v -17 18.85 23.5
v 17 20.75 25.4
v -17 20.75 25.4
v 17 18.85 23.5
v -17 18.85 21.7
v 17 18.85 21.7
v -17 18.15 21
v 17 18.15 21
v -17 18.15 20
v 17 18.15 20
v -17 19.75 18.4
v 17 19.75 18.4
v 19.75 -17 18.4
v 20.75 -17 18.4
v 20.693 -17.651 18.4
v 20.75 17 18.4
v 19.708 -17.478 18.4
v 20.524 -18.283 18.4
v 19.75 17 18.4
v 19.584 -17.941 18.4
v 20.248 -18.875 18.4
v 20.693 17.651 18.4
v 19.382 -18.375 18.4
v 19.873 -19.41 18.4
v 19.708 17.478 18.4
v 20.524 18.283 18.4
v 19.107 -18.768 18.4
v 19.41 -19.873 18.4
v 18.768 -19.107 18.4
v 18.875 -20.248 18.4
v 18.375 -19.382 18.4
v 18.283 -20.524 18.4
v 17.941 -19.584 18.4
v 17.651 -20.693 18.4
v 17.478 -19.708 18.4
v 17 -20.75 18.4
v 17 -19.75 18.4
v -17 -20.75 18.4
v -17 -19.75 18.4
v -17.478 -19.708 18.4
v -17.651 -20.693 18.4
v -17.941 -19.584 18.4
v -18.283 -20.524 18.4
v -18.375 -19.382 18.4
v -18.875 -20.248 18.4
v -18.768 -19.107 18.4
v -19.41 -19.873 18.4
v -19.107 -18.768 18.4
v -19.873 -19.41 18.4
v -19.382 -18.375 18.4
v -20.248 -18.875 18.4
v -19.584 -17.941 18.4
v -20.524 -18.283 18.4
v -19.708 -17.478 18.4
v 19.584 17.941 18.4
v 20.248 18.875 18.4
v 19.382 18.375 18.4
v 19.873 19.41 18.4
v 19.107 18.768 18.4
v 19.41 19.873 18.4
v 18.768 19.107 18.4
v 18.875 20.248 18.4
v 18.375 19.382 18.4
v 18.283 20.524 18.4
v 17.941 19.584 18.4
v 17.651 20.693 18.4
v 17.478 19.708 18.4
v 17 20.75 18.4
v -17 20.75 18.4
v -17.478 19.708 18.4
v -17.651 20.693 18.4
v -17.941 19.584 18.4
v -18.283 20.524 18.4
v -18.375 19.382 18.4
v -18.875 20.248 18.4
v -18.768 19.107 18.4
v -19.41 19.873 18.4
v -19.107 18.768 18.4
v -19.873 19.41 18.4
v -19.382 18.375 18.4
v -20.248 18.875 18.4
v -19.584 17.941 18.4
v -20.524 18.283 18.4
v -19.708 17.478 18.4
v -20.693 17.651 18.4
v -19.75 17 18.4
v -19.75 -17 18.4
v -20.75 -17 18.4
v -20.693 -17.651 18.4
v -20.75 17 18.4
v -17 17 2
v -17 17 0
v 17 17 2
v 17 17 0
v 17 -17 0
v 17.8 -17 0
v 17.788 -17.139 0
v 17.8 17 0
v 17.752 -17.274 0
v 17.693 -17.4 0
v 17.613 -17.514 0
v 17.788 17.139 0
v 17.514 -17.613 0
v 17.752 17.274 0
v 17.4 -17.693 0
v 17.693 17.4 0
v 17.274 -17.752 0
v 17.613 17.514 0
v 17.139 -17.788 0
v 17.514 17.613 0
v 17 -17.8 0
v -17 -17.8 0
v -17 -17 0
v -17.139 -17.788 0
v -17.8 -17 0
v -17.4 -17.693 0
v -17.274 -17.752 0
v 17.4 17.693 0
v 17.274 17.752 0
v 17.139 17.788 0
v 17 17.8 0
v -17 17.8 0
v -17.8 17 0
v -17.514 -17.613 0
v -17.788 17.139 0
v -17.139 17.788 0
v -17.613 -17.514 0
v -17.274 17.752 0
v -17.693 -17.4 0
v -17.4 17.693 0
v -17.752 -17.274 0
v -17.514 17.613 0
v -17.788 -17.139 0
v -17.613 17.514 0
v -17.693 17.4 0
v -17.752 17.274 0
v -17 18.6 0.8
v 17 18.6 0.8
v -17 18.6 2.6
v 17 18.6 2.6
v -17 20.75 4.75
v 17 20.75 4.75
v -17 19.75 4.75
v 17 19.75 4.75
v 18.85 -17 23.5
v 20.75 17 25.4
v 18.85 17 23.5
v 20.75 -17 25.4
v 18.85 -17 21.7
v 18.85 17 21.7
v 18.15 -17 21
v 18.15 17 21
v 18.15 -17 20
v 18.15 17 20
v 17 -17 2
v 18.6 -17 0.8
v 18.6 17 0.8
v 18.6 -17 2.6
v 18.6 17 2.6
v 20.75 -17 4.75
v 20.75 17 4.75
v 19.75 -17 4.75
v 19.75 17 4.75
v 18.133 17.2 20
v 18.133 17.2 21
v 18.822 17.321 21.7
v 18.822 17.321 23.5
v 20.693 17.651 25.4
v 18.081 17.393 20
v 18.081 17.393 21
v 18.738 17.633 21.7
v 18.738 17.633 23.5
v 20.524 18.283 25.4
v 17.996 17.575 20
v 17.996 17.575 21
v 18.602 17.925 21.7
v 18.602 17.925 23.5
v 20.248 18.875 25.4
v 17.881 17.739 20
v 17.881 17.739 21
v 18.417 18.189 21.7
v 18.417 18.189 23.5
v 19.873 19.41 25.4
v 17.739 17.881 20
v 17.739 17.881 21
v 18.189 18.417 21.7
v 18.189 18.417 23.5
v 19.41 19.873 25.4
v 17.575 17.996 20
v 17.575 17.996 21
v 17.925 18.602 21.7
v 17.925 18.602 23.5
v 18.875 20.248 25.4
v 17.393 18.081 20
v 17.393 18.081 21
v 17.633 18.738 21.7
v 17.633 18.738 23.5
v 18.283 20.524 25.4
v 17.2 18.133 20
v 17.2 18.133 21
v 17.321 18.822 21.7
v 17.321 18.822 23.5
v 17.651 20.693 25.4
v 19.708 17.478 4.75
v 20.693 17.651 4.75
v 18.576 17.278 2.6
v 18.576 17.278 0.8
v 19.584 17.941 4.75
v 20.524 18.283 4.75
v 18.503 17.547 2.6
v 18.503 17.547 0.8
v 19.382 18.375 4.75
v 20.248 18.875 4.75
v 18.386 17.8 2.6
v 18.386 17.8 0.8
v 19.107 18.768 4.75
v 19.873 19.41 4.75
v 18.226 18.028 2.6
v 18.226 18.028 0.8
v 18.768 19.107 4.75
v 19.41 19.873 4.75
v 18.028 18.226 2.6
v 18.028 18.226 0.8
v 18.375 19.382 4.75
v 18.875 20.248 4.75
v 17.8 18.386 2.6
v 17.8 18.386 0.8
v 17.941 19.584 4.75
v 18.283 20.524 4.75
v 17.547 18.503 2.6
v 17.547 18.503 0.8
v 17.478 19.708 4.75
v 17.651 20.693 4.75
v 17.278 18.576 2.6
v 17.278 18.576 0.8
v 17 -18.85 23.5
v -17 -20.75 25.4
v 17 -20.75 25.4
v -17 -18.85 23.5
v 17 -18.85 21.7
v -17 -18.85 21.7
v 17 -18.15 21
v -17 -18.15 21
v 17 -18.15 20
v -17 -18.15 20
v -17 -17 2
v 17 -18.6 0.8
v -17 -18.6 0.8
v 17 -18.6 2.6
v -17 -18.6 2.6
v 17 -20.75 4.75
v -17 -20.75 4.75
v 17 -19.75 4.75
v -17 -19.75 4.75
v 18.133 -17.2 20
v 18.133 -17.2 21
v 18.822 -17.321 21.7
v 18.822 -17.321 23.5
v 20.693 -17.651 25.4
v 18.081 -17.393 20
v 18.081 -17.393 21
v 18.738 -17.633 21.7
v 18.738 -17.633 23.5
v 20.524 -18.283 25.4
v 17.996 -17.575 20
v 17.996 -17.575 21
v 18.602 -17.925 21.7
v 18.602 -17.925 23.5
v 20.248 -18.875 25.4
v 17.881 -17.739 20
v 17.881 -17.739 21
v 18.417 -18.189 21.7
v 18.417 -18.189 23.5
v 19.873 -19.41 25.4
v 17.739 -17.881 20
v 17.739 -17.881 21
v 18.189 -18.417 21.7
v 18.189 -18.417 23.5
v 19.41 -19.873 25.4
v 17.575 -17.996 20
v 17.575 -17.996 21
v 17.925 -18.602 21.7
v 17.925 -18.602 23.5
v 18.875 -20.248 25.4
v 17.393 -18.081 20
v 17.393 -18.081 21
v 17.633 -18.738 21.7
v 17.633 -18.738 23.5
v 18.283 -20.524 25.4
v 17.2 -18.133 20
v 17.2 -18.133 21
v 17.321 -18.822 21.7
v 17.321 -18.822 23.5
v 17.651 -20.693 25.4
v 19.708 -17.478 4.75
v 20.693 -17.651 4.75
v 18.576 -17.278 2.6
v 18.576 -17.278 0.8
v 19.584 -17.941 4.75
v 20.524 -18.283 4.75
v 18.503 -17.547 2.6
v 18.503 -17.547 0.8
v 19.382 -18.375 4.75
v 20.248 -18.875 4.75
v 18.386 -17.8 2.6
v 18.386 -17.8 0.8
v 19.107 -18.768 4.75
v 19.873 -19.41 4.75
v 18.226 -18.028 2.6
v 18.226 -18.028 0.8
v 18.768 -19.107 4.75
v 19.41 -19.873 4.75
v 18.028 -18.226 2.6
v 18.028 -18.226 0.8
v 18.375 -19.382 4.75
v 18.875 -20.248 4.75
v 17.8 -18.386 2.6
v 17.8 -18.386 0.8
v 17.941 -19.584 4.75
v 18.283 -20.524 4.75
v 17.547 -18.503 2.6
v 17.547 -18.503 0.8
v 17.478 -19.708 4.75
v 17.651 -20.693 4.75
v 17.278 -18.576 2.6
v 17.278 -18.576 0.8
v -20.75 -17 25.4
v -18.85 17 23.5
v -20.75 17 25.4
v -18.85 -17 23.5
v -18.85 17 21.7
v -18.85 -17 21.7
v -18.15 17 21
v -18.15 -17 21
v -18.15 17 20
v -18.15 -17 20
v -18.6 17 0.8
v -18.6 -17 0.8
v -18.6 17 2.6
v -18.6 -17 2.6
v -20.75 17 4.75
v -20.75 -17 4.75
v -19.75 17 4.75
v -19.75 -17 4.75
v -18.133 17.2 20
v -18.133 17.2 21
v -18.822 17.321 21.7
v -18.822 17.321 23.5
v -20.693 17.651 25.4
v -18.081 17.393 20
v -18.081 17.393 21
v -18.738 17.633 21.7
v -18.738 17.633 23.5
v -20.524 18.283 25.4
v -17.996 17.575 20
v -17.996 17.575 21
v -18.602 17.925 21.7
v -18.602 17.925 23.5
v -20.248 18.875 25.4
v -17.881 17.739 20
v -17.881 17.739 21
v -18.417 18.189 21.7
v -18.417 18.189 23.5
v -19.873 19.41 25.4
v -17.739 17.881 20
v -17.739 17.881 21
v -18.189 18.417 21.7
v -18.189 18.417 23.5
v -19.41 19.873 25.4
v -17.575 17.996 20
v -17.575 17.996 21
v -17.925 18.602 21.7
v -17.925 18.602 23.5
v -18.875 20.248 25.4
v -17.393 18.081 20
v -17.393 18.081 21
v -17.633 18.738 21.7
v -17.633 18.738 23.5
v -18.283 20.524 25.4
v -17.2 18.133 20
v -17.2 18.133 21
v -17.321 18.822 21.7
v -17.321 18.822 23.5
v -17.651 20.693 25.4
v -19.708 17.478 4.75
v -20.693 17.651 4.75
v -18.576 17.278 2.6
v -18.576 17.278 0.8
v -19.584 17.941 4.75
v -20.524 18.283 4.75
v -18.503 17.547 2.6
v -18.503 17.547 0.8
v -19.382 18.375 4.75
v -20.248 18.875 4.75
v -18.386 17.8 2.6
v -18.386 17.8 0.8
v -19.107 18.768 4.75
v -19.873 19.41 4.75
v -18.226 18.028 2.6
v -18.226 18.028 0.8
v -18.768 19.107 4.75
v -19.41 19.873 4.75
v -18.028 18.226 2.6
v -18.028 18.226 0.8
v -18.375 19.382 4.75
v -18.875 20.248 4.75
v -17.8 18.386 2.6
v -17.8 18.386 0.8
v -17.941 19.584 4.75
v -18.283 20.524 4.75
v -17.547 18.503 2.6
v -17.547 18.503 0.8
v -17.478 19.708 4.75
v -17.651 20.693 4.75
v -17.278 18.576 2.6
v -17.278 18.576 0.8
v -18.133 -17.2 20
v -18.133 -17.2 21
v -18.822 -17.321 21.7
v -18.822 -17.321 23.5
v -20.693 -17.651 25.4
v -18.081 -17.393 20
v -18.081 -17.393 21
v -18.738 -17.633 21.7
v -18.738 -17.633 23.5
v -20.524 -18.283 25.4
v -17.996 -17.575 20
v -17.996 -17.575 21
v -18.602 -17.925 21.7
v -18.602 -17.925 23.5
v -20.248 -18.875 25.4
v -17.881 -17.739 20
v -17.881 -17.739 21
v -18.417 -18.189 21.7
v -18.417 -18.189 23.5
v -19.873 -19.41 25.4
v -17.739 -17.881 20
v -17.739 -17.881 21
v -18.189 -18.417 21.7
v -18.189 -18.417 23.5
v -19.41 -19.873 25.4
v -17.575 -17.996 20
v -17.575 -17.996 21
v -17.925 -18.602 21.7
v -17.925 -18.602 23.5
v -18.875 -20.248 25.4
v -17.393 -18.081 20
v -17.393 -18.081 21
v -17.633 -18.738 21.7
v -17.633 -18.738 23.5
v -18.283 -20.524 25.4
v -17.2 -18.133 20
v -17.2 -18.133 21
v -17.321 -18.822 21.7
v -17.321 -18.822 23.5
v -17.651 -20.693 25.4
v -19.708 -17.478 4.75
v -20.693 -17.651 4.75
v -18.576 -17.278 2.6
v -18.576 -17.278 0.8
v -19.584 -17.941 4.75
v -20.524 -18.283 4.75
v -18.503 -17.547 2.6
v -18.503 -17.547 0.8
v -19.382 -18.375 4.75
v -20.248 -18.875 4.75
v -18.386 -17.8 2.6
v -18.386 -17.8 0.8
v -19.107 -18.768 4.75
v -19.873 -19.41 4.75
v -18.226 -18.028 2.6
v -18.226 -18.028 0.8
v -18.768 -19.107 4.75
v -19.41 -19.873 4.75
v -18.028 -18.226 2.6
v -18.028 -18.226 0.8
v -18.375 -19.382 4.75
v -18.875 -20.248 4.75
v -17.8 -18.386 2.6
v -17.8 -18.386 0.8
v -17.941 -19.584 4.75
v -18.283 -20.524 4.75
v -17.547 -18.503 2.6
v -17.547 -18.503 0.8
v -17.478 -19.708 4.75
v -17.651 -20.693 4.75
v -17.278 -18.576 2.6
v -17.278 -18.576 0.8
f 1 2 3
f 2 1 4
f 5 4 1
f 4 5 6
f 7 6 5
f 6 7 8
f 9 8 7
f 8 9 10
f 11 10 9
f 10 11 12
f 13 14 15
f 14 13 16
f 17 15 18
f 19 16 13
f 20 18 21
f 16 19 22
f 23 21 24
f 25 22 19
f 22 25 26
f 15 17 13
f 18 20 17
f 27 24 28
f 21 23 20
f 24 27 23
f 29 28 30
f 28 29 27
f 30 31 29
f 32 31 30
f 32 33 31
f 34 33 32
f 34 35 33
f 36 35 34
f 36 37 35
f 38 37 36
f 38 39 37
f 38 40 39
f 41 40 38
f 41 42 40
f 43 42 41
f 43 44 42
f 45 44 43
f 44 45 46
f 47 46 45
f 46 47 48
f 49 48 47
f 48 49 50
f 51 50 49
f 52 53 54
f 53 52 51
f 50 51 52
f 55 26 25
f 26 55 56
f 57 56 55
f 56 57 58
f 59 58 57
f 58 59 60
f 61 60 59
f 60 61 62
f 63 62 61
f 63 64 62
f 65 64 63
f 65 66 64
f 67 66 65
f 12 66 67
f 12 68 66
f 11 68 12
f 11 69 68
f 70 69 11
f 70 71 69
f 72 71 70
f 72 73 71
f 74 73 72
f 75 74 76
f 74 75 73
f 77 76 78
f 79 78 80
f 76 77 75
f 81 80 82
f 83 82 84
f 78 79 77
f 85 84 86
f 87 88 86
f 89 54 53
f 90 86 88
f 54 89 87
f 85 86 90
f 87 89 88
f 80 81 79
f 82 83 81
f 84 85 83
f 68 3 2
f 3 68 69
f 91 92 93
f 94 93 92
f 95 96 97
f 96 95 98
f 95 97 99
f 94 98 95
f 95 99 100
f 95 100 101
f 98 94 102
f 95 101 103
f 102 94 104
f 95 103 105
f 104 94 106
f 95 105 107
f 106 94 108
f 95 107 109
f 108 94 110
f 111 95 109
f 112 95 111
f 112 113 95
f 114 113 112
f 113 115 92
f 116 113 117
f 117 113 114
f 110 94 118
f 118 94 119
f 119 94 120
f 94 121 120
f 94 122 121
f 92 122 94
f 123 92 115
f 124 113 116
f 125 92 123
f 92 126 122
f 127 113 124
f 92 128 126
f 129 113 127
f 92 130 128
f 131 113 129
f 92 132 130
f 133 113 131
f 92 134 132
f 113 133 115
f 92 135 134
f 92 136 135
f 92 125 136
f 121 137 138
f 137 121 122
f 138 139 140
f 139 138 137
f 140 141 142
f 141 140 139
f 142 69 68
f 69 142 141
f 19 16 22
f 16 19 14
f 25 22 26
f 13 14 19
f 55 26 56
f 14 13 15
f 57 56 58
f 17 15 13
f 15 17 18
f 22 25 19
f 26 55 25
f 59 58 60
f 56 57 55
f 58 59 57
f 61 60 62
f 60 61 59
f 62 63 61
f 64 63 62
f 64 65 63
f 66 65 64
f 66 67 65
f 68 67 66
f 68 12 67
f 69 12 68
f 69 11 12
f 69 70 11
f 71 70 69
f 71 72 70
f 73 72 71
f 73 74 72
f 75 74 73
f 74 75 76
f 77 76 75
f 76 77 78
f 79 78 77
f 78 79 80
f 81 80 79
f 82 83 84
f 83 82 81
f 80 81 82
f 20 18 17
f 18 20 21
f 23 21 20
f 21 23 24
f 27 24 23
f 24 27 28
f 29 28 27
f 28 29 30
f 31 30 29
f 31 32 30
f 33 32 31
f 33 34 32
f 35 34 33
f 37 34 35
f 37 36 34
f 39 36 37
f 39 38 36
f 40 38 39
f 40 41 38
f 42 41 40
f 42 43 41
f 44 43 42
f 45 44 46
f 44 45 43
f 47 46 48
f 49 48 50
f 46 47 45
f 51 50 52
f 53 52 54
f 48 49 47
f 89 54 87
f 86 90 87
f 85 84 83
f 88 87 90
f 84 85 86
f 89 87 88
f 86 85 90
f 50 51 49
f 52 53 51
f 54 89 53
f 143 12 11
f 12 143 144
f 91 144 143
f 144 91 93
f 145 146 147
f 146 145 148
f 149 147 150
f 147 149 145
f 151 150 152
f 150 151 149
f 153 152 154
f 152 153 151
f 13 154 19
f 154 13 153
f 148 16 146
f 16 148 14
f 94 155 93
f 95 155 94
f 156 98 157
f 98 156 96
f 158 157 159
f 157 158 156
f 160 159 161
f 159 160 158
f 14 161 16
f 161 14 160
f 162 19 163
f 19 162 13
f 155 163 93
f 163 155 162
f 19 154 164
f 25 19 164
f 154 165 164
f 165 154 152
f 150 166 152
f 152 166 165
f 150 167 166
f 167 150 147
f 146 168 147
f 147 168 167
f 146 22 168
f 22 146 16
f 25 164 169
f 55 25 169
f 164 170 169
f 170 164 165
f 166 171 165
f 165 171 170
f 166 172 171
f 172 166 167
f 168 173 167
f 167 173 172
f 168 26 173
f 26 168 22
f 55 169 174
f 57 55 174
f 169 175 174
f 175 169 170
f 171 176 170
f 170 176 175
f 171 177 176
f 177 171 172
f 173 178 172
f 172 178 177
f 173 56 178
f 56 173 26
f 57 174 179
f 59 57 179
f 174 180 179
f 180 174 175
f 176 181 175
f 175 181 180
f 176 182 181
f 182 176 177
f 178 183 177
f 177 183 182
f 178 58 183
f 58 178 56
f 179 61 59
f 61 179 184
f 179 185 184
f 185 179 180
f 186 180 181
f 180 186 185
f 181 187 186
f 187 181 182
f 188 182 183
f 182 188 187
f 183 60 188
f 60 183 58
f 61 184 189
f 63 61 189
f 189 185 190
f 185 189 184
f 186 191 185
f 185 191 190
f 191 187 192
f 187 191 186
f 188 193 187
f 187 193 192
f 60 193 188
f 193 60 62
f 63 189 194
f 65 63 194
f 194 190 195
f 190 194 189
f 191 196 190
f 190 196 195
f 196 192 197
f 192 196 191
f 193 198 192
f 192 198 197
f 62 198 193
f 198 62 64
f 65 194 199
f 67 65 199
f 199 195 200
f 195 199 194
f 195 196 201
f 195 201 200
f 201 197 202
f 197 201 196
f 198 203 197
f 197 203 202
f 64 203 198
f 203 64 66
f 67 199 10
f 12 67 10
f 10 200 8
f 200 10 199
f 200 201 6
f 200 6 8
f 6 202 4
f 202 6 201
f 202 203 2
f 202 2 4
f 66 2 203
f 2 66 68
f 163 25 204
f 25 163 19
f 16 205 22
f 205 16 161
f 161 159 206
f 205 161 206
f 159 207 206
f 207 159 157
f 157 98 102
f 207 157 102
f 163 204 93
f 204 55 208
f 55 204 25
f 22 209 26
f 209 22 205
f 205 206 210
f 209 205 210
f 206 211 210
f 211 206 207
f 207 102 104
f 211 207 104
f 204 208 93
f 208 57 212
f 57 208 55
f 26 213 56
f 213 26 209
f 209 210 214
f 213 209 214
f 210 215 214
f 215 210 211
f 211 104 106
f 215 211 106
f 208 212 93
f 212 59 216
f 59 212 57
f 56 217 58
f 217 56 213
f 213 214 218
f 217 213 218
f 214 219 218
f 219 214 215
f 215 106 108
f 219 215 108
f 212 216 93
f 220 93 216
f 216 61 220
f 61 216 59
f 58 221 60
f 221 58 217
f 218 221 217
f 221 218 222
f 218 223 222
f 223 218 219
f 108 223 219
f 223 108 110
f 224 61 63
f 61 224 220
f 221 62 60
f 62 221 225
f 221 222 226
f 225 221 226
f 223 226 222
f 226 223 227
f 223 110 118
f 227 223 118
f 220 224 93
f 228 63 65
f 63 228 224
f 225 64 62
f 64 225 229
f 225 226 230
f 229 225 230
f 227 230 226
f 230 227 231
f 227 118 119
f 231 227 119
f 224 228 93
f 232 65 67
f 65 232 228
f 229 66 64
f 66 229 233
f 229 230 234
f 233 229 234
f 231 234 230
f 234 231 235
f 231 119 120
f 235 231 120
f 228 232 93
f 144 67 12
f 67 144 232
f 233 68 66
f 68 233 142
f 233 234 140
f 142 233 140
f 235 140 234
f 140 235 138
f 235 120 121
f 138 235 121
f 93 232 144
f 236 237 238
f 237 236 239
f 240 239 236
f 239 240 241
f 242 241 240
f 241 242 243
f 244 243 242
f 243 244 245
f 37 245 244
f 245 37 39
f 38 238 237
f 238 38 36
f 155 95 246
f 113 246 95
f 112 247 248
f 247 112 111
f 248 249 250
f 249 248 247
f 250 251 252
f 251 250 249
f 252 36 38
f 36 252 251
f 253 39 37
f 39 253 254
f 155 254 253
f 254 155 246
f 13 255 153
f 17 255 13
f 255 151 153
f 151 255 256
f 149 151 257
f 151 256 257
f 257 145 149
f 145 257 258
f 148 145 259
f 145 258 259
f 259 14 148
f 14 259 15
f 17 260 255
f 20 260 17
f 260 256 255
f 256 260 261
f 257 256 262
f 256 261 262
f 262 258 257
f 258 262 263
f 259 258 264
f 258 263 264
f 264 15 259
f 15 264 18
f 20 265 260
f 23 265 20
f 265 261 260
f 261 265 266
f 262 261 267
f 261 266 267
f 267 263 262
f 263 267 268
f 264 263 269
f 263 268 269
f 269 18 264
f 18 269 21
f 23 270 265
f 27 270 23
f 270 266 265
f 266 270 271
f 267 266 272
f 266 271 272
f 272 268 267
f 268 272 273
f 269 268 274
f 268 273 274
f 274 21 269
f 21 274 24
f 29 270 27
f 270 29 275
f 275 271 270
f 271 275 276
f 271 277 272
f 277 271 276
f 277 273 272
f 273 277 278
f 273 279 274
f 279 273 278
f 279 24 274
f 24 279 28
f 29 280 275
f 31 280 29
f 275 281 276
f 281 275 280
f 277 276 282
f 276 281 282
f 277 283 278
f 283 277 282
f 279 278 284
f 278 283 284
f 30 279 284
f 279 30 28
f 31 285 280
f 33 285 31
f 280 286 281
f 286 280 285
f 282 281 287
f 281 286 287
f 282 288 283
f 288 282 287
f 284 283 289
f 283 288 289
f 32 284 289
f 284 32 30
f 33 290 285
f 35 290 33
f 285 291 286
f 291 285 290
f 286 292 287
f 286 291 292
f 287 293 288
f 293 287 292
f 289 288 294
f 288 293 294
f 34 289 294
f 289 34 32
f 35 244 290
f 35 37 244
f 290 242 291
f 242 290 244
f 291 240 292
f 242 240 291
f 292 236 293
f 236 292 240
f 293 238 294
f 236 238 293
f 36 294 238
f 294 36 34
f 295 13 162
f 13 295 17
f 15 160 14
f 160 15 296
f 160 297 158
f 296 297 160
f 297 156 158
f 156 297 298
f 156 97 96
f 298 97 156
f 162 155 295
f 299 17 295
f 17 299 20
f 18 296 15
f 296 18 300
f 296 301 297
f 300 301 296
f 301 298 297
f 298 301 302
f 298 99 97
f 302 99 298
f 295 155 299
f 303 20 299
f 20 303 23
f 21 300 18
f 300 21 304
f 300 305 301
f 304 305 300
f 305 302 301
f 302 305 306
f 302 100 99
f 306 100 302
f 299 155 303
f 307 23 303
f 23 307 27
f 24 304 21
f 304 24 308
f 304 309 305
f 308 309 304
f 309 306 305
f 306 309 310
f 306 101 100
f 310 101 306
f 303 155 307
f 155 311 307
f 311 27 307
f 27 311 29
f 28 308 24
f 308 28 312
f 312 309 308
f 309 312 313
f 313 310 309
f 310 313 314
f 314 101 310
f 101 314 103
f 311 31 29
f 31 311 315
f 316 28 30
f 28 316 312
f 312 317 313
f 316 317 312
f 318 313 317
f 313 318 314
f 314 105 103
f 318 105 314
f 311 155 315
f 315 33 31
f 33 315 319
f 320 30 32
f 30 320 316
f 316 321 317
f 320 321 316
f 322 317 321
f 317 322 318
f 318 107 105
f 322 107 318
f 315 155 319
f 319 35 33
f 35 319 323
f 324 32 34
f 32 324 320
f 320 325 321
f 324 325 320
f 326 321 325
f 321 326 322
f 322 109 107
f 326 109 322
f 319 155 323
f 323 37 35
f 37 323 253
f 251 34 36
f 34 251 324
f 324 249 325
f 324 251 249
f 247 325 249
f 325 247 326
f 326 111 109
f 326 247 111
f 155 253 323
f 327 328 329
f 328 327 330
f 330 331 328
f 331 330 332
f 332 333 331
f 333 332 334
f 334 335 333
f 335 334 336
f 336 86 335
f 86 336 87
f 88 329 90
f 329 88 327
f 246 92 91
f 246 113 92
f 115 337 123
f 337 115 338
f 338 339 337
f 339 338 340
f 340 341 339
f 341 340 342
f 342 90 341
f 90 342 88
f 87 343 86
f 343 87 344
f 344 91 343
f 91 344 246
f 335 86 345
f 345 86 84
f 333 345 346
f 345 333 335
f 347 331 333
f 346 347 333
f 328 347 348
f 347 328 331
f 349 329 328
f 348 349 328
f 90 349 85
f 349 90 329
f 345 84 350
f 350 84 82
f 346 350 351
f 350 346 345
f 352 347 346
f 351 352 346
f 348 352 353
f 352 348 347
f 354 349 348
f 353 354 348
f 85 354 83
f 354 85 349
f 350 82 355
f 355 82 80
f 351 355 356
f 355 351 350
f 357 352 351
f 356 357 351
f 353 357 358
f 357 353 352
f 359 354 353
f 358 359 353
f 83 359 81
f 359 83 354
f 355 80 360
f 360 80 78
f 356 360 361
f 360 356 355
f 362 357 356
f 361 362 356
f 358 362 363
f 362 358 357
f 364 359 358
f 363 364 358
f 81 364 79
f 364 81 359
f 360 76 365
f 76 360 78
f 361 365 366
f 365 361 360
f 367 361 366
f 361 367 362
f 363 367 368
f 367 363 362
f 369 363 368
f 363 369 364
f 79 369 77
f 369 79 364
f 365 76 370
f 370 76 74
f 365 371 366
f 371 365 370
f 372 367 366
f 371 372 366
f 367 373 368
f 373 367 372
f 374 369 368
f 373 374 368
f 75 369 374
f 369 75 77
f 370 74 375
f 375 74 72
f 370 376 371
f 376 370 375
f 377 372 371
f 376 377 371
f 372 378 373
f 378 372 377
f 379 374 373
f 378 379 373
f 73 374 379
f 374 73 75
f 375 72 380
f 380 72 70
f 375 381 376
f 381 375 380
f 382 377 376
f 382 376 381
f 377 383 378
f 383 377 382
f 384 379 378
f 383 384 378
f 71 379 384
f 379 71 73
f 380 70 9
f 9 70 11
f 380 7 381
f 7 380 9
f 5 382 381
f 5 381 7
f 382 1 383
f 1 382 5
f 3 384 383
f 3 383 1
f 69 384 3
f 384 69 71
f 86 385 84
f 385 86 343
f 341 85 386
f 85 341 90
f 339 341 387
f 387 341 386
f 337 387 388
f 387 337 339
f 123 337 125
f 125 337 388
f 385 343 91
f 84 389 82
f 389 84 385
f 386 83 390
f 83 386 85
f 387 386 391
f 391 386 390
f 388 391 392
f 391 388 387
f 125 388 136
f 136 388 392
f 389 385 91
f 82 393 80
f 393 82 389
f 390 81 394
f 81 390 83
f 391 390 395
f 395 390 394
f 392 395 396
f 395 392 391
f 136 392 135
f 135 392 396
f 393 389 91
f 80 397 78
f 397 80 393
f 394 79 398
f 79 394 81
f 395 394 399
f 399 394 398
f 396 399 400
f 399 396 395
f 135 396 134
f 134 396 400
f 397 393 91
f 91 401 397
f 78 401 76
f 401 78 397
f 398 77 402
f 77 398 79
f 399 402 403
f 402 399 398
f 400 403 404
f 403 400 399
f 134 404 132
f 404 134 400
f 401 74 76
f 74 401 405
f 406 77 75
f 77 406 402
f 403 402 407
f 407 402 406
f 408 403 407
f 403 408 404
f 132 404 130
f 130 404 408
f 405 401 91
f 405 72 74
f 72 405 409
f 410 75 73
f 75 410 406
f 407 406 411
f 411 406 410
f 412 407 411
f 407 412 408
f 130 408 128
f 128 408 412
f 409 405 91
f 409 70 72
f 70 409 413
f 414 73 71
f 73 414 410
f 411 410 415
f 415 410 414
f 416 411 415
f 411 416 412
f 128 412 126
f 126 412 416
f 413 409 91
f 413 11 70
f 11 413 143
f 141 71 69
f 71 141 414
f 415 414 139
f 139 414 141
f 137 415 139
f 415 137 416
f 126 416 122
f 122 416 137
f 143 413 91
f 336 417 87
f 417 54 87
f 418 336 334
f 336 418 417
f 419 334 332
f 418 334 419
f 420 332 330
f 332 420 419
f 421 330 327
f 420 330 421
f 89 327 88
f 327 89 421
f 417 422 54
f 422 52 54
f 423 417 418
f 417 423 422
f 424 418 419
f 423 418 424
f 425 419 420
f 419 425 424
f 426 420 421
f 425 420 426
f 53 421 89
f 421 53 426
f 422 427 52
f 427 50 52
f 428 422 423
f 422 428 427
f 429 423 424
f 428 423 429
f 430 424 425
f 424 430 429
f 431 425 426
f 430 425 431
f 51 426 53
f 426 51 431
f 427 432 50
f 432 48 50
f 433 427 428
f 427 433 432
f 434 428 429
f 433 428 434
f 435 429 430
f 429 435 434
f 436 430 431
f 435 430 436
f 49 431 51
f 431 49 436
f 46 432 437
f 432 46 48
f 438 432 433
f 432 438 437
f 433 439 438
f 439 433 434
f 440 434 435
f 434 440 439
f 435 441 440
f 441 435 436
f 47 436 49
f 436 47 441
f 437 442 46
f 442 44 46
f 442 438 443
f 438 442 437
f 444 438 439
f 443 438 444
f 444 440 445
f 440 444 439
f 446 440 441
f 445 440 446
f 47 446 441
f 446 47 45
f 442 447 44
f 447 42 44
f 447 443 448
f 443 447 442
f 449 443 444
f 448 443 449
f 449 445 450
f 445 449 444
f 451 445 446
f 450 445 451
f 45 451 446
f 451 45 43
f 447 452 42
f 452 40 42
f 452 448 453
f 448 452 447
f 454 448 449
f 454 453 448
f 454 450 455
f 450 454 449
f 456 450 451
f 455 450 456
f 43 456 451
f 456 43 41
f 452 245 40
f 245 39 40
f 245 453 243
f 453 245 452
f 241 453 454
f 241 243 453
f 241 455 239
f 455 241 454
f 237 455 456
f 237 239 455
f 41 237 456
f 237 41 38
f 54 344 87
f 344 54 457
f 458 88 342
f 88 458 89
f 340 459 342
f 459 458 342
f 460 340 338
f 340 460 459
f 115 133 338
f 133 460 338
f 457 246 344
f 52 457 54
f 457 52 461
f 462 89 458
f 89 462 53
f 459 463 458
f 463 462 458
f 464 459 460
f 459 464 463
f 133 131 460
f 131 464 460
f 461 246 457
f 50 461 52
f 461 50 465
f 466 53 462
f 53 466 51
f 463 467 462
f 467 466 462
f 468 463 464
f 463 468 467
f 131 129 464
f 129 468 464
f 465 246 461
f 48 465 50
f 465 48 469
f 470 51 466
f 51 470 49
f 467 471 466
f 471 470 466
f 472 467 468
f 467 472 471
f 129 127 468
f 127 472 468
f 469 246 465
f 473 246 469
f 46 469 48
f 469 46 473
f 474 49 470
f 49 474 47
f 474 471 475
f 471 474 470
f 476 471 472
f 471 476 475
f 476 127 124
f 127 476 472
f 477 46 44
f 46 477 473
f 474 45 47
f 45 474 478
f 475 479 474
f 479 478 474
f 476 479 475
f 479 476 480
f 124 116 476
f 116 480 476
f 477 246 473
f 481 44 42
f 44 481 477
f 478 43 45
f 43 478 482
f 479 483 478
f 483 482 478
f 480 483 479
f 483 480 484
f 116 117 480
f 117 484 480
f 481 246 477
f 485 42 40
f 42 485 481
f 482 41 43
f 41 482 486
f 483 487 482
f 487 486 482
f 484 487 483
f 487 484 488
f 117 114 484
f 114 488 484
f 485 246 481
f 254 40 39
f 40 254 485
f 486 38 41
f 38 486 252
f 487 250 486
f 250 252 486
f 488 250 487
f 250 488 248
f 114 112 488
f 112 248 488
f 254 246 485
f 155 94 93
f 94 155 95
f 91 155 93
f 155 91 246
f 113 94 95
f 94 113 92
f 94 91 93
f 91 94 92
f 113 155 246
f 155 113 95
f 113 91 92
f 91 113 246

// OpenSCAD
// file: ../hp_utils.scad
$fa=1;
$fs=0.4;
// Creates a nice macro for movements//from manual
module move(x=0,y=0,z=0,rx=0,ry=0,rz=0)
{ translate([x,y,z])rotate([rx,ry,rz]) children(); }
// Macro to repeat along x and/or y
module repeat(x=0,y=0,z=0){ children();move(x=x,y=y,z=z)children(); }
module mirrorx(){ children(); mirror([1,0,0]) children(); }//mirror across x (+x -> -x)
module mirrory(){ children(); mirror([0,1,0]) children(); }// mirror across y (+y -> -y)
module mirrorz(){ children(); mirror([0,0,1]) children(); }// mirror across y (+y -> -y)
module mirror4(){ mirrorx() mirrory() children(); }

module lin_ext(H=2)
{
	linear_extrude(height=H,convexity=10)children();
}
module rot_ext(A=2)
{
	rotate_extrude(angle=A,convexity=10)children();
}

module fillet(r=1){
	// The corner of this shape is at the origin, and it lies in the third quadrant.
	// move to origin to corner to round the corner. Rotate as appropriate. 
	// remove this shape from 2d plan to get fillet.
	translate([-r,-r])difference(){
		square([r,r]);
		circle(r=r);
	}
}


module posfillet(r=1){
	// Corner to be fileted is not at the origin, center of circle is.
	// In some cases, the center of rounding is the reference point for applying the filet
	difference(){
		square([r,r]);
		circle(r=r);
	}
}

module apply_fillet(X=0,Y=0,r=1,A=0){
// A is the angle of the fillet
	difference(){
		children(0);
		move(x=X,y=Y)move(rz=A)fillet(r);
	}
}

module gen_fillet(r=1,A=60){
// A here is the half-angle of the corner being filleted
// A = 45 corresponds to regular quarter fillet
	difference(){
		polygon([[0,0],[-r/tan(A),0],[-r/tan(A)+r*sin(2*A),-r-r*cos(2*A)]]);
		move(x=-r/tan(A),y=-r)circle(r);
	}
}

module apply_gen_fillet(X=0,Y=0,r=1,A=0,B=45){
// A defines orientation of filet. Default means top right corner of square is being filleted (third quadrant in fillet frame)
// B here is the half-angle of the corner being filleted
// B = 45 corresponds to regular quarter fillet
	difference(){
		children(0);
		move(x=X,y=Y)move(rz=A)gen_fillet(r,B);
	}
}

module rounded_rect(L,W,r){ // creates a filleted quarter rect and mirrors to get a rounded rectangle
	mirror4()difference(){
		square([L/2,W/2]);
		move(x=L/2,y=W/2)fillet(r=r);
	}
}


module round_rect_fillet(L=5,W=5,r=1){ // assumes that the mass is in the second quadrant, and you want to cut out things close to the origin
	difference(){
		children(0);
		union(){
			mirror4()move(x=L/2-r,y=W/2-r)rotate_extrude(angle=90)move(x=r)children(1);
			mirror4()move(x=L/2,rx=90)linear_extrude(W/2+0.01-r)children(1);
			mirror4()move(y=-W/2,ry=90)linear_extrude(L/2+0.01-r)children(1);
		}
	}
}



module round_rect_fillet_int(L=5,W=5,r=1){ 
	union(){
		children(0);
		union(){
			mirror4()move(x=L/2-r,y=W/2-r)rotate_extrude(angle=90)move(x=r)children(1);
			mirror4()move(x=L/2,rx=90)linear_extrude(W/2+0.01-r)children(1);
			mirror4()move(y=-W/2,ry=90)linear_extrude(L/2+0.01-r)move(rz=180)children(1);
		}
	}
}

// For snapping box lids (
module tabs(tab_L=10,tab_W=2,ry=90,dx=10){ 
	//  tab_W is the thickness of the tab along $z$ when $ry=90$, tab_L is the width along $y$, 2*dx is the separation between the tabs.
	//  Typically you add tabs to one mating surface and remove same tab from the other mating surface, with some tolerance to enable snapping
	mirrorx()move(x=dx,ry=ry) {
		linear_extrude(tab_W/2,scale=[0,(tab_L-tab_W)/(tab_L)])square([tab_W,tab_L],center=true);
	}
}
// main file
include <../hp_utils.scad>
$fa=10;
$fs=0.1;
n_height = 1;
module baseplate_profile(){ // seems unused
	translate([0.25,0])polygon([[0,0],[2.85,0],[2.85,4.65],[0.7,2.5],[0.7,0.7]]);
	// 2.85+0.25+0.6
}

module binbase_profile(wall_thickness=1.2,floor_height=2){
	// The bottom should add 0.8 mm to the base, so that we have 41.5 = 3.75 + 34 + 3.75
	polygon([[0,floor_height+0.8],[-0.8,floor_height],[-0.8,0],[0,0],[0.8,0.8],[0.8,2.6],[0.8+2.15,2.6+2.15],[0.8+2.15,7],[2.95-wall_thickness,7],[2.95-wall_thickness,0.8+floor_height+0.8+2.15-wall_thickness]]);
	translate([-0.8,0])square([0.8,1]);
}

module lip_profile(wall_thickness=1.2){
	// profile of lip at the upper part to allow a bin to stack on top
	translate([0.35,14+7*n_height])polygon([[0,0],[0.7,0.7],[0.7,2.5],[2.6,4.4],[2.6,0],[2.6,-2.6],[2.6-wall_thickness,-2.6],[0,-wall_thickness]]);
	// actual wall:
	translate([0.35+2.6-wall_thickness,7])square([wall_thickness,4.4+7*n_height]);
}

// Assemble profiles. 3D is perhaps a misnomer
module baseplate_3D(){
	move(x=0.8){
		//translate([0,-10])baseplate_profile();
		binbase_profile(1.0,2);
		lip_profile(1.0);
	}
}
// extrude assembled profile to get bin walls
mirrorx()move(x=17)mirrory(){
	move(y=17,x=-17)move(rz=90)move(rx=90)lin_ext(H=17.0)baseplate_3D();
	move(rx=90)lin_ext(H=17.0)baseplate_3D();
	move(y=17)rot_ext(A=90)baseplate_3D();
}
// bottom plate
mirror4()cube([17.0,17.0,2.0]);
